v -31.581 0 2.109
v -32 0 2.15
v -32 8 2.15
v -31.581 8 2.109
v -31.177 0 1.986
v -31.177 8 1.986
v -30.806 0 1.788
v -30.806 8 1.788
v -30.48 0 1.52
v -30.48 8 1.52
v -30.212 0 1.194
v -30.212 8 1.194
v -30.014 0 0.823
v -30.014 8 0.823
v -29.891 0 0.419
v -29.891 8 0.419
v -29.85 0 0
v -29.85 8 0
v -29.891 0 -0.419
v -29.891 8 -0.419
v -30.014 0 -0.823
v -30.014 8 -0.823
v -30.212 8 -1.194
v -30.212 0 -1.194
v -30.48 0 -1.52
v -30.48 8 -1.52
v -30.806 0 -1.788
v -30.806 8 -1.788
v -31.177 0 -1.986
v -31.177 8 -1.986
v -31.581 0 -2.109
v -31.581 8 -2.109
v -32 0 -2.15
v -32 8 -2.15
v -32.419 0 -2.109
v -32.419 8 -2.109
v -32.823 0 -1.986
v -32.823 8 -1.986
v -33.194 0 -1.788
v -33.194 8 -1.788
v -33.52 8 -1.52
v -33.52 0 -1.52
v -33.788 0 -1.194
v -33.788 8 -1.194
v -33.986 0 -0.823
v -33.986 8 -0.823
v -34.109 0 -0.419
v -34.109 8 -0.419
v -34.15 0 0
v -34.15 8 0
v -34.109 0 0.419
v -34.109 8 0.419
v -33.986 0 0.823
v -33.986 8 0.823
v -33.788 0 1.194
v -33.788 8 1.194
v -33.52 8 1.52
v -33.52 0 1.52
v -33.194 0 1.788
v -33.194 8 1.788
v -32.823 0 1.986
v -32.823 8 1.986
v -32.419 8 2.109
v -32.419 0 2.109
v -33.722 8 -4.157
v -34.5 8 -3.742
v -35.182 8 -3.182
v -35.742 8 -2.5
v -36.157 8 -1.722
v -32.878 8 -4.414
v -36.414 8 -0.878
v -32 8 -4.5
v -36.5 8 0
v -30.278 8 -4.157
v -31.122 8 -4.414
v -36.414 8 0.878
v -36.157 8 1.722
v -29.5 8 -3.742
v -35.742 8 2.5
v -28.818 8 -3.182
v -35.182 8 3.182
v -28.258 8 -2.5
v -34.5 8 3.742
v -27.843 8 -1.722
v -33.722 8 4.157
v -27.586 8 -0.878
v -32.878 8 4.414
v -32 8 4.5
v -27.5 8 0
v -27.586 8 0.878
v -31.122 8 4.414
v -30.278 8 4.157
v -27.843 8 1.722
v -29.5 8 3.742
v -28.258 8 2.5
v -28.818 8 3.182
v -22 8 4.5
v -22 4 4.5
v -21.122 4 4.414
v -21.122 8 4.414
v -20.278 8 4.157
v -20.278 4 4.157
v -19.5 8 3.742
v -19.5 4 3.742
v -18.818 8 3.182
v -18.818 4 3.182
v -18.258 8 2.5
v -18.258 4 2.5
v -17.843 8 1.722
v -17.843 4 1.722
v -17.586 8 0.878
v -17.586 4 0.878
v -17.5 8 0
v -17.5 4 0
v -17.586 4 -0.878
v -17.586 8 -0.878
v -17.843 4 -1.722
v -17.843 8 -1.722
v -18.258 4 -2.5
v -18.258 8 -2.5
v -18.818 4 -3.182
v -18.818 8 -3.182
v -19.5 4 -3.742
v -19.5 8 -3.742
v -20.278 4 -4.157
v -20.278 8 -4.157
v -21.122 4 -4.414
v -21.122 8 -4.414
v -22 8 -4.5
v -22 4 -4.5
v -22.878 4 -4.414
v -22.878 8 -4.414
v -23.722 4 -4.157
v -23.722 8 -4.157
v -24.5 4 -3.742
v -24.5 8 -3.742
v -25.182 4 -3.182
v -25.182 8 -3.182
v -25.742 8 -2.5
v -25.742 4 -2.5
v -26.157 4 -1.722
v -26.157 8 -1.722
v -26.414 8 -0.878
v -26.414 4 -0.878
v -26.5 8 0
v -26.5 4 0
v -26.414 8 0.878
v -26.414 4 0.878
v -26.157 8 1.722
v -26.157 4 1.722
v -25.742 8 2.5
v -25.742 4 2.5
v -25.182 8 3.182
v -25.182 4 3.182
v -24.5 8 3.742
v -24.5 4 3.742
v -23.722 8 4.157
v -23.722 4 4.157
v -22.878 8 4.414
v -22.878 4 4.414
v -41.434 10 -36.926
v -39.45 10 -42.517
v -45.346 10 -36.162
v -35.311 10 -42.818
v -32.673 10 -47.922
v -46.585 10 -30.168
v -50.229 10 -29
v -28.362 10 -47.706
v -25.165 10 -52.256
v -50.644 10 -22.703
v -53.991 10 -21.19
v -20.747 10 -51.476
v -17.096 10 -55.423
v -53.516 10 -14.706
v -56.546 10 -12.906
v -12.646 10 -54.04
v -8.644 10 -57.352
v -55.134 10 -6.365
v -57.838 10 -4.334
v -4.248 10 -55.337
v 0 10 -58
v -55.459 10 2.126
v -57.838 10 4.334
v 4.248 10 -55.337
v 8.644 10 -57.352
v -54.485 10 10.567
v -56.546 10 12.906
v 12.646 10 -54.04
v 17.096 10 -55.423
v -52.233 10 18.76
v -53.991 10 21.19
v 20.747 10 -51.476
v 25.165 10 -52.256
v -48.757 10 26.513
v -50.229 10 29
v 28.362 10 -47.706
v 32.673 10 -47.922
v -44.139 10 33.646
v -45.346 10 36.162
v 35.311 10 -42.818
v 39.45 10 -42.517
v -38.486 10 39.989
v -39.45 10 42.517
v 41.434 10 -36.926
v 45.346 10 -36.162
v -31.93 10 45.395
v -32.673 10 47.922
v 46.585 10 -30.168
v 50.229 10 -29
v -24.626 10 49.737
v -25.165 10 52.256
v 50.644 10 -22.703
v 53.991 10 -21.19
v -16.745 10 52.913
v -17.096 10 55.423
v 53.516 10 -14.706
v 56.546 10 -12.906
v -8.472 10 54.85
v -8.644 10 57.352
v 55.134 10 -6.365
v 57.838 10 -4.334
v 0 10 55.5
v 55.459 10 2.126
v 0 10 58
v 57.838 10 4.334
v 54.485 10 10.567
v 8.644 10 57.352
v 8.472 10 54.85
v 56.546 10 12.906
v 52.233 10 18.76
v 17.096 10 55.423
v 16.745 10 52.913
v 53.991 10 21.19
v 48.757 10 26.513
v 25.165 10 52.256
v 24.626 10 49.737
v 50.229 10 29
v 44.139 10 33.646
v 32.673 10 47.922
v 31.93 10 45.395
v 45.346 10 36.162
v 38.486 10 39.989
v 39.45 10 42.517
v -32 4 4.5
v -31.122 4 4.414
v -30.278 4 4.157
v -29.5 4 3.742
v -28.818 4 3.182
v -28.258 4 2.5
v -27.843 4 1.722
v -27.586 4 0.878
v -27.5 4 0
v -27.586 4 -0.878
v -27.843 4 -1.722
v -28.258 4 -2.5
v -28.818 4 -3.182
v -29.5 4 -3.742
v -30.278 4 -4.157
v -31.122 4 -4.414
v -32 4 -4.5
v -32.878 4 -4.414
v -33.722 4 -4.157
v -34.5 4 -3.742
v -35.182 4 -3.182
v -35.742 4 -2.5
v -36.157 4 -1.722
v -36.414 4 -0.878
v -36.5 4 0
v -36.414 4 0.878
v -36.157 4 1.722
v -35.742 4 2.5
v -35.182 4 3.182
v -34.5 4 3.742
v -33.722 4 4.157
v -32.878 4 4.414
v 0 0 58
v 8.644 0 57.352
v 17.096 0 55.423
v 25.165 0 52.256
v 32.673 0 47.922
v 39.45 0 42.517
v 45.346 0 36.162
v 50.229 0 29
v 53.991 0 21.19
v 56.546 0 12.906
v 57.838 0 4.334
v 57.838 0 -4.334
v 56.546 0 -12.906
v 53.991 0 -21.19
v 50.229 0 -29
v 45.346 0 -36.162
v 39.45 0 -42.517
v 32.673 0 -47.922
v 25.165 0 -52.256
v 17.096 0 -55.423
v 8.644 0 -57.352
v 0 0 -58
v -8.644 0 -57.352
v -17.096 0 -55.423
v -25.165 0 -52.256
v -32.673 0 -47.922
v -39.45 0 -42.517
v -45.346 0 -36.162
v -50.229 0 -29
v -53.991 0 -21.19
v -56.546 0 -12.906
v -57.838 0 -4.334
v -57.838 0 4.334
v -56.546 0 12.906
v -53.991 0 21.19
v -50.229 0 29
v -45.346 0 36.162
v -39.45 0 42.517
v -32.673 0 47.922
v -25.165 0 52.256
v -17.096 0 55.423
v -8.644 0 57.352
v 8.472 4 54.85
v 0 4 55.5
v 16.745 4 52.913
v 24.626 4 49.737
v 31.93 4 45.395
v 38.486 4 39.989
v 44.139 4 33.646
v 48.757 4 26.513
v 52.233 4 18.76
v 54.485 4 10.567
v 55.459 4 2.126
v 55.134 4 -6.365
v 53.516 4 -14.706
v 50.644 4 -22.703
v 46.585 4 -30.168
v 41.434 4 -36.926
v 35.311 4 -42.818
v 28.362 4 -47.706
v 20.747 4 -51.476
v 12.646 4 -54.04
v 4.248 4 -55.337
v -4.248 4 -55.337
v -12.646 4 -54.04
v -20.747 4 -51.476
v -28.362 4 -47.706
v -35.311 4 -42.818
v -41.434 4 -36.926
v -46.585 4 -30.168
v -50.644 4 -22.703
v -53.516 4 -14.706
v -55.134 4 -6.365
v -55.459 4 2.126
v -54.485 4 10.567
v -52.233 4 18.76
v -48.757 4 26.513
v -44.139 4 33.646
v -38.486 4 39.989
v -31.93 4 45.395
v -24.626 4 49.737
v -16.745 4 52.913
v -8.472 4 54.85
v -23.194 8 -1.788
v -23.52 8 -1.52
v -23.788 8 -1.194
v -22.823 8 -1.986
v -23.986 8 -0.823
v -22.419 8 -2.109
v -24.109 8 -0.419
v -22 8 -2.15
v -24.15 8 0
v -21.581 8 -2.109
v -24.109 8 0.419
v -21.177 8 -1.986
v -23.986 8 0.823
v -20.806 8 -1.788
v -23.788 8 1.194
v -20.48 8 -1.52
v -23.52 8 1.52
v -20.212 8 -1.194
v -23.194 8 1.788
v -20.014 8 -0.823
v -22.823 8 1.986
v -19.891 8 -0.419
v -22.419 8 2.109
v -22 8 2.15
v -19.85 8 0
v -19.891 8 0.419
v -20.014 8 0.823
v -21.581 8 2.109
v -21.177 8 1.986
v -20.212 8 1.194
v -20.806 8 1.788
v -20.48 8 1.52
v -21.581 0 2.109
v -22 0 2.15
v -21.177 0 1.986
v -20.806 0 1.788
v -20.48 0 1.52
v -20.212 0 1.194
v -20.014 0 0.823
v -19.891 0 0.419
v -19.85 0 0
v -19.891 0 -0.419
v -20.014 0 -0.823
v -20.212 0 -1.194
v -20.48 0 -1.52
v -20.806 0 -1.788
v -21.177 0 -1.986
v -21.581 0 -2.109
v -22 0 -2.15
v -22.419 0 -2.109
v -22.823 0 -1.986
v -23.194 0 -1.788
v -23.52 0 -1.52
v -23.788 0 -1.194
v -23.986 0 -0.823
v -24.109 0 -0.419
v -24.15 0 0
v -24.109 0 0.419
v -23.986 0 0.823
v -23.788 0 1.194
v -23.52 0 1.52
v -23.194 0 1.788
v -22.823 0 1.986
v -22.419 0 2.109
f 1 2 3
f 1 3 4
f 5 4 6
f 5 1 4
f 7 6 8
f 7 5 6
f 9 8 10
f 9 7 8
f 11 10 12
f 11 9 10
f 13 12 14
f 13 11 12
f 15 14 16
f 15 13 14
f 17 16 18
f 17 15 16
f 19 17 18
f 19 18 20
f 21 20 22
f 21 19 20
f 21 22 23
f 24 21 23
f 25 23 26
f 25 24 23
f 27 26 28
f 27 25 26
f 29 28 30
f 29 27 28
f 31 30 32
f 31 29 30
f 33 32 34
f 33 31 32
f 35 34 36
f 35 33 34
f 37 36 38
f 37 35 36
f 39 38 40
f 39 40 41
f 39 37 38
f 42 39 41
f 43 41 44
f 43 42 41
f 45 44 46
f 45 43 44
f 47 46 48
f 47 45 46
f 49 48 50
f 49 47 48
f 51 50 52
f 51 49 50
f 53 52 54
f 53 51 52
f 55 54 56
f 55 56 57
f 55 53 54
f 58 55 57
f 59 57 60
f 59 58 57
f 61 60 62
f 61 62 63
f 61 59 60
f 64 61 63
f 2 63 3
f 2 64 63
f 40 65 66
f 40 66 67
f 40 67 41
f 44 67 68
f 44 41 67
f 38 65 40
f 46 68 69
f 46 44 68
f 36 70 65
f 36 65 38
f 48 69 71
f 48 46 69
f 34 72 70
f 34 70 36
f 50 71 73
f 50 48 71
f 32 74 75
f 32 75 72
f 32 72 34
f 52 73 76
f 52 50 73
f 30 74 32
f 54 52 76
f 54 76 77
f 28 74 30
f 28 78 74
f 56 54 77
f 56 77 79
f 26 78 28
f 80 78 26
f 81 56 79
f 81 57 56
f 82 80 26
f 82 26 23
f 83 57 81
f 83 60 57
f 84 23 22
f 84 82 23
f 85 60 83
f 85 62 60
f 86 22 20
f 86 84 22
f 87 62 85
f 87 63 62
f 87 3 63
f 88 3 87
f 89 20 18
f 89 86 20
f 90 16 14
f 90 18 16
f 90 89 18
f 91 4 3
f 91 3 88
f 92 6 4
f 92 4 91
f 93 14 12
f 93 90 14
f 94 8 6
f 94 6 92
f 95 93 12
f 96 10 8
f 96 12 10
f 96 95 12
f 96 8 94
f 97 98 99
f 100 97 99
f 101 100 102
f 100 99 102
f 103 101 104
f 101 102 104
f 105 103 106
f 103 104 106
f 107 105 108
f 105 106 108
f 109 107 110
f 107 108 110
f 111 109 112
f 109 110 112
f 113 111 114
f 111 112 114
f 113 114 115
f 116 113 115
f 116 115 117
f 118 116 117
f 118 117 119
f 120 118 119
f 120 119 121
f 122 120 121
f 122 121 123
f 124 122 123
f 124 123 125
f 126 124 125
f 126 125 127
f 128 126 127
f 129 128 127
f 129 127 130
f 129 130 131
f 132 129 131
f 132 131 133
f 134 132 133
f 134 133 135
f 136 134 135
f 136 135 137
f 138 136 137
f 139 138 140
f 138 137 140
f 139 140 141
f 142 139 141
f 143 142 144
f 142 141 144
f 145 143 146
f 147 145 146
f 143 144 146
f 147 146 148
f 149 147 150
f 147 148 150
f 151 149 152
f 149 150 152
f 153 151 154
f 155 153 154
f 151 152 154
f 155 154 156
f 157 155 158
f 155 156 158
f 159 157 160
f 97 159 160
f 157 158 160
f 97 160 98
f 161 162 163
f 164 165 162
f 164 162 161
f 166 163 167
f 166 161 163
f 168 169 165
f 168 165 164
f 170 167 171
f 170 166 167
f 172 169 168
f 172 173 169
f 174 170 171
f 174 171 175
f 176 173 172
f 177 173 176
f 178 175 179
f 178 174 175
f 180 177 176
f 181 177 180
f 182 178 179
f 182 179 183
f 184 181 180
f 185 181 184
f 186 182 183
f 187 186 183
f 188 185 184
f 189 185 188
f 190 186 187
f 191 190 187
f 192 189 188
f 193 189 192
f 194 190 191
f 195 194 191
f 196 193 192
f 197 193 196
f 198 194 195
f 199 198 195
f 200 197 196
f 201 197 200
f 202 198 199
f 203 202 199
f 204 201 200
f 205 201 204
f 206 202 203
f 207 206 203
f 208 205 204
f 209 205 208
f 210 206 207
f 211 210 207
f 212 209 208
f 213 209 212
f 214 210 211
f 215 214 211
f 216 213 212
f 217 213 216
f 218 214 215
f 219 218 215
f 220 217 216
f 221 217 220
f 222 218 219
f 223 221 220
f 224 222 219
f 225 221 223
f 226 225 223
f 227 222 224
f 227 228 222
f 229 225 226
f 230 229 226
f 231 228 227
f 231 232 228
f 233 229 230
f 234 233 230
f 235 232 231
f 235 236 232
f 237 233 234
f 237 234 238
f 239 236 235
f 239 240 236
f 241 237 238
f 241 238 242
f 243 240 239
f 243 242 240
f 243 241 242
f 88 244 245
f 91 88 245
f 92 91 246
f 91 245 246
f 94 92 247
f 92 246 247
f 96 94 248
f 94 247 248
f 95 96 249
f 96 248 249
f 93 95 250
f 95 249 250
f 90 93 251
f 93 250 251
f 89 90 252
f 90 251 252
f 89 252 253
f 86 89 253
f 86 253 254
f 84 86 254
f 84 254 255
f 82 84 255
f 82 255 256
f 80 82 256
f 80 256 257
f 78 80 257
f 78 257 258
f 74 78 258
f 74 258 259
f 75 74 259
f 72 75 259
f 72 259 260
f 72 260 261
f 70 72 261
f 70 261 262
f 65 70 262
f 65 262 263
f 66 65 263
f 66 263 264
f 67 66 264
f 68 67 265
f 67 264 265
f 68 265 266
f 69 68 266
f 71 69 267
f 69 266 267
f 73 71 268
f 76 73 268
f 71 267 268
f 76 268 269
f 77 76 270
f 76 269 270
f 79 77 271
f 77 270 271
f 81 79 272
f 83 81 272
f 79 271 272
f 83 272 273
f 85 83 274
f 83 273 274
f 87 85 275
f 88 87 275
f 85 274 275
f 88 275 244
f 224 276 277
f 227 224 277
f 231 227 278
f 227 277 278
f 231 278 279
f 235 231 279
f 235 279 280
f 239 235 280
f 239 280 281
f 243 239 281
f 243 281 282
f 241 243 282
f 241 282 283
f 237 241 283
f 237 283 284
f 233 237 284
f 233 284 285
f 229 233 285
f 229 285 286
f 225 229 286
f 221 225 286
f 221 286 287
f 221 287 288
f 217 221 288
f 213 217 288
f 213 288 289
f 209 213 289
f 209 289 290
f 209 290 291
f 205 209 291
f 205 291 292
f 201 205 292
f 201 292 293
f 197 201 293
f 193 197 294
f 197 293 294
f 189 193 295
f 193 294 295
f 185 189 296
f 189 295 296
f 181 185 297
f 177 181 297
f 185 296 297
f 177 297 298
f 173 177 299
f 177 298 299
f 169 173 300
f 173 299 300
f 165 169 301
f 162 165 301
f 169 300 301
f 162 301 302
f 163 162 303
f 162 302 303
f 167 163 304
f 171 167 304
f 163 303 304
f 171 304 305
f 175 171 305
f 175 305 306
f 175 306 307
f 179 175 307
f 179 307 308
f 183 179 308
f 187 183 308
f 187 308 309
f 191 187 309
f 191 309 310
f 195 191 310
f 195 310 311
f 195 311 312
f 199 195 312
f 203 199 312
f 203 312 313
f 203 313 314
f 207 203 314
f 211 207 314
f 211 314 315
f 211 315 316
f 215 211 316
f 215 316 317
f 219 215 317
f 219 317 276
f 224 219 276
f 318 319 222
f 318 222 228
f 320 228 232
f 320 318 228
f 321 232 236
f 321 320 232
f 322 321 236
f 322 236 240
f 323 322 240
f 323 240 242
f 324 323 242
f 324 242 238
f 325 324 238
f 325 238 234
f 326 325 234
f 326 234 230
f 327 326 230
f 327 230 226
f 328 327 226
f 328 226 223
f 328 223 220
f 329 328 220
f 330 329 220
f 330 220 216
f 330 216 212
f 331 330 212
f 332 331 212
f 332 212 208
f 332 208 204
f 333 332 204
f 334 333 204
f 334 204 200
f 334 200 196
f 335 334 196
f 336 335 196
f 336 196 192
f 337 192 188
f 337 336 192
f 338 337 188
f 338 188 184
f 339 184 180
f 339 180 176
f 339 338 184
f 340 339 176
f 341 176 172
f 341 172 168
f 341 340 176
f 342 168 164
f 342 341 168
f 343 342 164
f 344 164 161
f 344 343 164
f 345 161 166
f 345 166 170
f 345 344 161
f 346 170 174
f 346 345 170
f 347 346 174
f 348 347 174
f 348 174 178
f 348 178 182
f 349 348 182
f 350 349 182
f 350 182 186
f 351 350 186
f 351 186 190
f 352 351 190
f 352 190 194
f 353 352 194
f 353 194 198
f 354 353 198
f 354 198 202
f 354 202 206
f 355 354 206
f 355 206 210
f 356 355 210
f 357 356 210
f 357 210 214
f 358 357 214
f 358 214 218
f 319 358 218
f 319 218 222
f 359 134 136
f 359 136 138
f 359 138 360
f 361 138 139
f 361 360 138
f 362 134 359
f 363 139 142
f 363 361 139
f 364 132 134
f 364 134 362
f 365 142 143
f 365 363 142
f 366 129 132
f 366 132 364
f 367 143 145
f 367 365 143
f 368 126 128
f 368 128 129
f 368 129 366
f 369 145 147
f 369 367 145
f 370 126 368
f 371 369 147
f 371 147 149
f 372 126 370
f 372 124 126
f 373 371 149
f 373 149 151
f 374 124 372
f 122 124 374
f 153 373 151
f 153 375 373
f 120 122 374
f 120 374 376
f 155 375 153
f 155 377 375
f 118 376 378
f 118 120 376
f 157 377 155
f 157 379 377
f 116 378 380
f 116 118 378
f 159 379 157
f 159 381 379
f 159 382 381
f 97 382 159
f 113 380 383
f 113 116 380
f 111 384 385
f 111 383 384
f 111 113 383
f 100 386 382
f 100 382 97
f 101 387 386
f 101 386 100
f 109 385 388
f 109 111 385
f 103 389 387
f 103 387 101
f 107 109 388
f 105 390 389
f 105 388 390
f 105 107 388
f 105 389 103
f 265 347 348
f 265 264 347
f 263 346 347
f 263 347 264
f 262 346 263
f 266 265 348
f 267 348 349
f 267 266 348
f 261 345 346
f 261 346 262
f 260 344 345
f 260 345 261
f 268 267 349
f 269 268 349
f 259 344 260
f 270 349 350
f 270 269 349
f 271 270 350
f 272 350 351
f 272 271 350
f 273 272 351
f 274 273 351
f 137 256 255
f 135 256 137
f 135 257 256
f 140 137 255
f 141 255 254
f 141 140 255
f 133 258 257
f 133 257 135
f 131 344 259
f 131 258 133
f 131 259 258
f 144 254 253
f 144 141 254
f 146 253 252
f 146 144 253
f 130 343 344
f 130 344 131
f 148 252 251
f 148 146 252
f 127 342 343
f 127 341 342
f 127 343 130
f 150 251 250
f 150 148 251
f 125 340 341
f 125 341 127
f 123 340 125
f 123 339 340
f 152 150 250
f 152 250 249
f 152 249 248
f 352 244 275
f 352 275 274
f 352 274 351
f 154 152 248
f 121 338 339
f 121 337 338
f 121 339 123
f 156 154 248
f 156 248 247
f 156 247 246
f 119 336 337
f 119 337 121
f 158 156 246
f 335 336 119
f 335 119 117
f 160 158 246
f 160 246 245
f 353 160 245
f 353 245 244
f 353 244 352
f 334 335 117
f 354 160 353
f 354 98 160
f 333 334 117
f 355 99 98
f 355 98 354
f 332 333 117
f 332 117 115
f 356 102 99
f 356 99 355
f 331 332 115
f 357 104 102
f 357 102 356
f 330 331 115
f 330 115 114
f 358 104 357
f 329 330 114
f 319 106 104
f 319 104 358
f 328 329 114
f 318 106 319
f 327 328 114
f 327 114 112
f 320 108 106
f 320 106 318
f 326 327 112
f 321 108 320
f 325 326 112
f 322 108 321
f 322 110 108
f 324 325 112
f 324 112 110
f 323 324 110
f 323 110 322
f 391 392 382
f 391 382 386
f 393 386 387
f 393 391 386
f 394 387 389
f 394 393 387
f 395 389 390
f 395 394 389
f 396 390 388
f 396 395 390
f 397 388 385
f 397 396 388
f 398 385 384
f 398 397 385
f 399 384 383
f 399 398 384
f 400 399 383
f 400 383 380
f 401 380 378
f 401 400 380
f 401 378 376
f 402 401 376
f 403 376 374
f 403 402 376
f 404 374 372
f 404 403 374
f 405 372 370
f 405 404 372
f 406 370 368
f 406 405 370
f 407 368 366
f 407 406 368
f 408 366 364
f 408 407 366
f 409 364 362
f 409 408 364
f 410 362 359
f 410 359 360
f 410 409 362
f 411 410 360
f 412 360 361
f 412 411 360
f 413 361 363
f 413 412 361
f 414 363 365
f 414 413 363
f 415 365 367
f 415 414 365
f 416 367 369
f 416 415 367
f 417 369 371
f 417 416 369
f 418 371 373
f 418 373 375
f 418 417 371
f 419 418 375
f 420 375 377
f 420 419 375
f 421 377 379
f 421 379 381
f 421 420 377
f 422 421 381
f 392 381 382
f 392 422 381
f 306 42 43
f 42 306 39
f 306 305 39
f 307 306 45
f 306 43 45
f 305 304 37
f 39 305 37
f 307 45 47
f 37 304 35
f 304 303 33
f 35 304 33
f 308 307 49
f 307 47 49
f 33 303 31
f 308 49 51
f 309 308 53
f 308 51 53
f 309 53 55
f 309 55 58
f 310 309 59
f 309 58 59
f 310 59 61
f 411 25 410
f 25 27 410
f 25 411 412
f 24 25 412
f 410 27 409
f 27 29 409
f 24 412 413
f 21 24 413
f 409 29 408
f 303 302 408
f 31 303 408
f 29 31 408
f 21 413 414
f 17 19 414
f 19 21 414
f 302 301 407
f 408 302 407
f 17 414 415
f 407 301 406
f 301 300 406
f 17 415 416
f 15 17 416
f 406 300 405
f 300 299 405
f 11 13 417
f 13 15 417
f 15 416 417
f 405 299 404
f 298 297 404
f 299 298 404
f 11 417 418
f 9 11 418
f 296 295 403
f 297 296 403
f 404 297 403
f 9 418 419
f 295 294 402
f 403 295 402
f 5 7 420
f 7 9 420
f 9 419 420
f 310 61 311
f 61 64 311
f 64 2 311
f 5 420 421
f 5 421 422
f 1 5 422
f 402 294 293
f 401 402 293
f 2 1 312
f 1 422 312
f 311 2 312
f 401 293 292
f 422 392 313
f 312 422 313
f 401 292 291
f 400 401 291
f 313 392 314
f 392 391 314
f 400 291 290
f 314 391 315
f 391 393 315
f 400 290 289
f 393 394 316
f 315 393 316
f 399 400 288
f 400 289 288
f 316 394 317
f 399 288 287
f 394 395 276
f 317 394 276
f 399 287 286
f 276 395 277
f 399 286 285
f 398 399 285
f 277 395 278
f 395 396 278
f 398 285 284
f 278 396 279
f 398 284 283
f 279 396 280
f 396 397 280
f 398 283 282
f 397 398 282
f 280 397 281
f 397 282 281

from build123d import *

# Parameters (mm, degrees)
SKETCH_1_R                       = 4.5
MOVING_POST_A_DEPTH              = 8
SKETCH_2_R                       = 58
CUP_PLATE_D116_T4_DEPTH          = 4
SKETCH_3_R                       = 4.5
MOVING_POST_B_DEPTH              = 8
SKETCH_4_R                       = 58
SKETCH_4_R_2                     = 55.5
DRIP_SKIRT_OD116_ID111_H10_DEPTH = 10
SKETCH_5_R                       = 2.15
M4_MOVING_MOUNT_CLEARANCE_DEPTH  = 8


with BuildPart() as part:
    # 草图1 → Moving_post_A (new body)
    with BuildSketch(Plane(origin=(0, 0, 0), x_dir=(1, 0, 0), z_dir=(0, 1, 0))):
        with Locations(Location((-22, 0, 0), (0, 0, 270))):
            Circle(SKETCH_1_R)
    extrude(amount=MOVING_POST_A_DEPTH)

    # 草图2 → Cup_plate_D116_T4 (add)
    with BuildSketch(Plane(origin=(0, 0, 0), x_dir=(1, 0, 0), z_dir=(0, 1, 0))):
        with Locations(Location((0, 0, 0), (0, 0, 270))):
            Circle(SKETCH_2_R)
    extrude(amount=CUP_PLATE_D116_T4_DEPTH)

    # 草图3 → Moving_post_B (add)
    with BuildSketch(Plane(origin=(0, 0, 0), x_dir=(1, 0, 0), z_dir=(0, 1, 0))):
        with Locations(Location((-32, 0, 0), (0, 0, 270))):
            Circle(SKETCH_3_R)
    extrude(amount=MOVING_POST_B_DEPTH)

    # 草图4 → Drip_skirt_OD116_ID111_H10 (add)
    with BuildSketch(Plane(origin=(0, 0, 0), x_dir=(1, 0, 0), z_dir=(0, 1, 0))):
        with Locations(Location((0, 0, 0), (0, 0, 270))):
            Circle(SKETCH_4_R)
        with Locations(Location((0, 0, 0), (0, 0, 270))):
            Circle(SKETCH_4_R_2, mode=Mode.SUBTRACT)
    extrude(amount=DRIP_SKIRT_OD116_ID111_H10_DEPTH)

    # 草图5 → M4_moving_mount_clearance (cut)
    with BuildSketch(Plane(origin=(0, 0, 0), x_dir=(1, 0, 0), z_dir=(0, 1, 0))):
        with Locations(Location((-22, 0, 0), (0, 0, 270))):
            Circle(SKETCH_5_R)
        with Locations(Location((-32, 0, 0), (0, 0, 270))):
            Circle(SKETCH_5_R)
    extrude(amount=M4_MOVING_MOUNT_CLEARANCE_DEPTH, mode=Mode.SUBTRACT)


solid = part.part
